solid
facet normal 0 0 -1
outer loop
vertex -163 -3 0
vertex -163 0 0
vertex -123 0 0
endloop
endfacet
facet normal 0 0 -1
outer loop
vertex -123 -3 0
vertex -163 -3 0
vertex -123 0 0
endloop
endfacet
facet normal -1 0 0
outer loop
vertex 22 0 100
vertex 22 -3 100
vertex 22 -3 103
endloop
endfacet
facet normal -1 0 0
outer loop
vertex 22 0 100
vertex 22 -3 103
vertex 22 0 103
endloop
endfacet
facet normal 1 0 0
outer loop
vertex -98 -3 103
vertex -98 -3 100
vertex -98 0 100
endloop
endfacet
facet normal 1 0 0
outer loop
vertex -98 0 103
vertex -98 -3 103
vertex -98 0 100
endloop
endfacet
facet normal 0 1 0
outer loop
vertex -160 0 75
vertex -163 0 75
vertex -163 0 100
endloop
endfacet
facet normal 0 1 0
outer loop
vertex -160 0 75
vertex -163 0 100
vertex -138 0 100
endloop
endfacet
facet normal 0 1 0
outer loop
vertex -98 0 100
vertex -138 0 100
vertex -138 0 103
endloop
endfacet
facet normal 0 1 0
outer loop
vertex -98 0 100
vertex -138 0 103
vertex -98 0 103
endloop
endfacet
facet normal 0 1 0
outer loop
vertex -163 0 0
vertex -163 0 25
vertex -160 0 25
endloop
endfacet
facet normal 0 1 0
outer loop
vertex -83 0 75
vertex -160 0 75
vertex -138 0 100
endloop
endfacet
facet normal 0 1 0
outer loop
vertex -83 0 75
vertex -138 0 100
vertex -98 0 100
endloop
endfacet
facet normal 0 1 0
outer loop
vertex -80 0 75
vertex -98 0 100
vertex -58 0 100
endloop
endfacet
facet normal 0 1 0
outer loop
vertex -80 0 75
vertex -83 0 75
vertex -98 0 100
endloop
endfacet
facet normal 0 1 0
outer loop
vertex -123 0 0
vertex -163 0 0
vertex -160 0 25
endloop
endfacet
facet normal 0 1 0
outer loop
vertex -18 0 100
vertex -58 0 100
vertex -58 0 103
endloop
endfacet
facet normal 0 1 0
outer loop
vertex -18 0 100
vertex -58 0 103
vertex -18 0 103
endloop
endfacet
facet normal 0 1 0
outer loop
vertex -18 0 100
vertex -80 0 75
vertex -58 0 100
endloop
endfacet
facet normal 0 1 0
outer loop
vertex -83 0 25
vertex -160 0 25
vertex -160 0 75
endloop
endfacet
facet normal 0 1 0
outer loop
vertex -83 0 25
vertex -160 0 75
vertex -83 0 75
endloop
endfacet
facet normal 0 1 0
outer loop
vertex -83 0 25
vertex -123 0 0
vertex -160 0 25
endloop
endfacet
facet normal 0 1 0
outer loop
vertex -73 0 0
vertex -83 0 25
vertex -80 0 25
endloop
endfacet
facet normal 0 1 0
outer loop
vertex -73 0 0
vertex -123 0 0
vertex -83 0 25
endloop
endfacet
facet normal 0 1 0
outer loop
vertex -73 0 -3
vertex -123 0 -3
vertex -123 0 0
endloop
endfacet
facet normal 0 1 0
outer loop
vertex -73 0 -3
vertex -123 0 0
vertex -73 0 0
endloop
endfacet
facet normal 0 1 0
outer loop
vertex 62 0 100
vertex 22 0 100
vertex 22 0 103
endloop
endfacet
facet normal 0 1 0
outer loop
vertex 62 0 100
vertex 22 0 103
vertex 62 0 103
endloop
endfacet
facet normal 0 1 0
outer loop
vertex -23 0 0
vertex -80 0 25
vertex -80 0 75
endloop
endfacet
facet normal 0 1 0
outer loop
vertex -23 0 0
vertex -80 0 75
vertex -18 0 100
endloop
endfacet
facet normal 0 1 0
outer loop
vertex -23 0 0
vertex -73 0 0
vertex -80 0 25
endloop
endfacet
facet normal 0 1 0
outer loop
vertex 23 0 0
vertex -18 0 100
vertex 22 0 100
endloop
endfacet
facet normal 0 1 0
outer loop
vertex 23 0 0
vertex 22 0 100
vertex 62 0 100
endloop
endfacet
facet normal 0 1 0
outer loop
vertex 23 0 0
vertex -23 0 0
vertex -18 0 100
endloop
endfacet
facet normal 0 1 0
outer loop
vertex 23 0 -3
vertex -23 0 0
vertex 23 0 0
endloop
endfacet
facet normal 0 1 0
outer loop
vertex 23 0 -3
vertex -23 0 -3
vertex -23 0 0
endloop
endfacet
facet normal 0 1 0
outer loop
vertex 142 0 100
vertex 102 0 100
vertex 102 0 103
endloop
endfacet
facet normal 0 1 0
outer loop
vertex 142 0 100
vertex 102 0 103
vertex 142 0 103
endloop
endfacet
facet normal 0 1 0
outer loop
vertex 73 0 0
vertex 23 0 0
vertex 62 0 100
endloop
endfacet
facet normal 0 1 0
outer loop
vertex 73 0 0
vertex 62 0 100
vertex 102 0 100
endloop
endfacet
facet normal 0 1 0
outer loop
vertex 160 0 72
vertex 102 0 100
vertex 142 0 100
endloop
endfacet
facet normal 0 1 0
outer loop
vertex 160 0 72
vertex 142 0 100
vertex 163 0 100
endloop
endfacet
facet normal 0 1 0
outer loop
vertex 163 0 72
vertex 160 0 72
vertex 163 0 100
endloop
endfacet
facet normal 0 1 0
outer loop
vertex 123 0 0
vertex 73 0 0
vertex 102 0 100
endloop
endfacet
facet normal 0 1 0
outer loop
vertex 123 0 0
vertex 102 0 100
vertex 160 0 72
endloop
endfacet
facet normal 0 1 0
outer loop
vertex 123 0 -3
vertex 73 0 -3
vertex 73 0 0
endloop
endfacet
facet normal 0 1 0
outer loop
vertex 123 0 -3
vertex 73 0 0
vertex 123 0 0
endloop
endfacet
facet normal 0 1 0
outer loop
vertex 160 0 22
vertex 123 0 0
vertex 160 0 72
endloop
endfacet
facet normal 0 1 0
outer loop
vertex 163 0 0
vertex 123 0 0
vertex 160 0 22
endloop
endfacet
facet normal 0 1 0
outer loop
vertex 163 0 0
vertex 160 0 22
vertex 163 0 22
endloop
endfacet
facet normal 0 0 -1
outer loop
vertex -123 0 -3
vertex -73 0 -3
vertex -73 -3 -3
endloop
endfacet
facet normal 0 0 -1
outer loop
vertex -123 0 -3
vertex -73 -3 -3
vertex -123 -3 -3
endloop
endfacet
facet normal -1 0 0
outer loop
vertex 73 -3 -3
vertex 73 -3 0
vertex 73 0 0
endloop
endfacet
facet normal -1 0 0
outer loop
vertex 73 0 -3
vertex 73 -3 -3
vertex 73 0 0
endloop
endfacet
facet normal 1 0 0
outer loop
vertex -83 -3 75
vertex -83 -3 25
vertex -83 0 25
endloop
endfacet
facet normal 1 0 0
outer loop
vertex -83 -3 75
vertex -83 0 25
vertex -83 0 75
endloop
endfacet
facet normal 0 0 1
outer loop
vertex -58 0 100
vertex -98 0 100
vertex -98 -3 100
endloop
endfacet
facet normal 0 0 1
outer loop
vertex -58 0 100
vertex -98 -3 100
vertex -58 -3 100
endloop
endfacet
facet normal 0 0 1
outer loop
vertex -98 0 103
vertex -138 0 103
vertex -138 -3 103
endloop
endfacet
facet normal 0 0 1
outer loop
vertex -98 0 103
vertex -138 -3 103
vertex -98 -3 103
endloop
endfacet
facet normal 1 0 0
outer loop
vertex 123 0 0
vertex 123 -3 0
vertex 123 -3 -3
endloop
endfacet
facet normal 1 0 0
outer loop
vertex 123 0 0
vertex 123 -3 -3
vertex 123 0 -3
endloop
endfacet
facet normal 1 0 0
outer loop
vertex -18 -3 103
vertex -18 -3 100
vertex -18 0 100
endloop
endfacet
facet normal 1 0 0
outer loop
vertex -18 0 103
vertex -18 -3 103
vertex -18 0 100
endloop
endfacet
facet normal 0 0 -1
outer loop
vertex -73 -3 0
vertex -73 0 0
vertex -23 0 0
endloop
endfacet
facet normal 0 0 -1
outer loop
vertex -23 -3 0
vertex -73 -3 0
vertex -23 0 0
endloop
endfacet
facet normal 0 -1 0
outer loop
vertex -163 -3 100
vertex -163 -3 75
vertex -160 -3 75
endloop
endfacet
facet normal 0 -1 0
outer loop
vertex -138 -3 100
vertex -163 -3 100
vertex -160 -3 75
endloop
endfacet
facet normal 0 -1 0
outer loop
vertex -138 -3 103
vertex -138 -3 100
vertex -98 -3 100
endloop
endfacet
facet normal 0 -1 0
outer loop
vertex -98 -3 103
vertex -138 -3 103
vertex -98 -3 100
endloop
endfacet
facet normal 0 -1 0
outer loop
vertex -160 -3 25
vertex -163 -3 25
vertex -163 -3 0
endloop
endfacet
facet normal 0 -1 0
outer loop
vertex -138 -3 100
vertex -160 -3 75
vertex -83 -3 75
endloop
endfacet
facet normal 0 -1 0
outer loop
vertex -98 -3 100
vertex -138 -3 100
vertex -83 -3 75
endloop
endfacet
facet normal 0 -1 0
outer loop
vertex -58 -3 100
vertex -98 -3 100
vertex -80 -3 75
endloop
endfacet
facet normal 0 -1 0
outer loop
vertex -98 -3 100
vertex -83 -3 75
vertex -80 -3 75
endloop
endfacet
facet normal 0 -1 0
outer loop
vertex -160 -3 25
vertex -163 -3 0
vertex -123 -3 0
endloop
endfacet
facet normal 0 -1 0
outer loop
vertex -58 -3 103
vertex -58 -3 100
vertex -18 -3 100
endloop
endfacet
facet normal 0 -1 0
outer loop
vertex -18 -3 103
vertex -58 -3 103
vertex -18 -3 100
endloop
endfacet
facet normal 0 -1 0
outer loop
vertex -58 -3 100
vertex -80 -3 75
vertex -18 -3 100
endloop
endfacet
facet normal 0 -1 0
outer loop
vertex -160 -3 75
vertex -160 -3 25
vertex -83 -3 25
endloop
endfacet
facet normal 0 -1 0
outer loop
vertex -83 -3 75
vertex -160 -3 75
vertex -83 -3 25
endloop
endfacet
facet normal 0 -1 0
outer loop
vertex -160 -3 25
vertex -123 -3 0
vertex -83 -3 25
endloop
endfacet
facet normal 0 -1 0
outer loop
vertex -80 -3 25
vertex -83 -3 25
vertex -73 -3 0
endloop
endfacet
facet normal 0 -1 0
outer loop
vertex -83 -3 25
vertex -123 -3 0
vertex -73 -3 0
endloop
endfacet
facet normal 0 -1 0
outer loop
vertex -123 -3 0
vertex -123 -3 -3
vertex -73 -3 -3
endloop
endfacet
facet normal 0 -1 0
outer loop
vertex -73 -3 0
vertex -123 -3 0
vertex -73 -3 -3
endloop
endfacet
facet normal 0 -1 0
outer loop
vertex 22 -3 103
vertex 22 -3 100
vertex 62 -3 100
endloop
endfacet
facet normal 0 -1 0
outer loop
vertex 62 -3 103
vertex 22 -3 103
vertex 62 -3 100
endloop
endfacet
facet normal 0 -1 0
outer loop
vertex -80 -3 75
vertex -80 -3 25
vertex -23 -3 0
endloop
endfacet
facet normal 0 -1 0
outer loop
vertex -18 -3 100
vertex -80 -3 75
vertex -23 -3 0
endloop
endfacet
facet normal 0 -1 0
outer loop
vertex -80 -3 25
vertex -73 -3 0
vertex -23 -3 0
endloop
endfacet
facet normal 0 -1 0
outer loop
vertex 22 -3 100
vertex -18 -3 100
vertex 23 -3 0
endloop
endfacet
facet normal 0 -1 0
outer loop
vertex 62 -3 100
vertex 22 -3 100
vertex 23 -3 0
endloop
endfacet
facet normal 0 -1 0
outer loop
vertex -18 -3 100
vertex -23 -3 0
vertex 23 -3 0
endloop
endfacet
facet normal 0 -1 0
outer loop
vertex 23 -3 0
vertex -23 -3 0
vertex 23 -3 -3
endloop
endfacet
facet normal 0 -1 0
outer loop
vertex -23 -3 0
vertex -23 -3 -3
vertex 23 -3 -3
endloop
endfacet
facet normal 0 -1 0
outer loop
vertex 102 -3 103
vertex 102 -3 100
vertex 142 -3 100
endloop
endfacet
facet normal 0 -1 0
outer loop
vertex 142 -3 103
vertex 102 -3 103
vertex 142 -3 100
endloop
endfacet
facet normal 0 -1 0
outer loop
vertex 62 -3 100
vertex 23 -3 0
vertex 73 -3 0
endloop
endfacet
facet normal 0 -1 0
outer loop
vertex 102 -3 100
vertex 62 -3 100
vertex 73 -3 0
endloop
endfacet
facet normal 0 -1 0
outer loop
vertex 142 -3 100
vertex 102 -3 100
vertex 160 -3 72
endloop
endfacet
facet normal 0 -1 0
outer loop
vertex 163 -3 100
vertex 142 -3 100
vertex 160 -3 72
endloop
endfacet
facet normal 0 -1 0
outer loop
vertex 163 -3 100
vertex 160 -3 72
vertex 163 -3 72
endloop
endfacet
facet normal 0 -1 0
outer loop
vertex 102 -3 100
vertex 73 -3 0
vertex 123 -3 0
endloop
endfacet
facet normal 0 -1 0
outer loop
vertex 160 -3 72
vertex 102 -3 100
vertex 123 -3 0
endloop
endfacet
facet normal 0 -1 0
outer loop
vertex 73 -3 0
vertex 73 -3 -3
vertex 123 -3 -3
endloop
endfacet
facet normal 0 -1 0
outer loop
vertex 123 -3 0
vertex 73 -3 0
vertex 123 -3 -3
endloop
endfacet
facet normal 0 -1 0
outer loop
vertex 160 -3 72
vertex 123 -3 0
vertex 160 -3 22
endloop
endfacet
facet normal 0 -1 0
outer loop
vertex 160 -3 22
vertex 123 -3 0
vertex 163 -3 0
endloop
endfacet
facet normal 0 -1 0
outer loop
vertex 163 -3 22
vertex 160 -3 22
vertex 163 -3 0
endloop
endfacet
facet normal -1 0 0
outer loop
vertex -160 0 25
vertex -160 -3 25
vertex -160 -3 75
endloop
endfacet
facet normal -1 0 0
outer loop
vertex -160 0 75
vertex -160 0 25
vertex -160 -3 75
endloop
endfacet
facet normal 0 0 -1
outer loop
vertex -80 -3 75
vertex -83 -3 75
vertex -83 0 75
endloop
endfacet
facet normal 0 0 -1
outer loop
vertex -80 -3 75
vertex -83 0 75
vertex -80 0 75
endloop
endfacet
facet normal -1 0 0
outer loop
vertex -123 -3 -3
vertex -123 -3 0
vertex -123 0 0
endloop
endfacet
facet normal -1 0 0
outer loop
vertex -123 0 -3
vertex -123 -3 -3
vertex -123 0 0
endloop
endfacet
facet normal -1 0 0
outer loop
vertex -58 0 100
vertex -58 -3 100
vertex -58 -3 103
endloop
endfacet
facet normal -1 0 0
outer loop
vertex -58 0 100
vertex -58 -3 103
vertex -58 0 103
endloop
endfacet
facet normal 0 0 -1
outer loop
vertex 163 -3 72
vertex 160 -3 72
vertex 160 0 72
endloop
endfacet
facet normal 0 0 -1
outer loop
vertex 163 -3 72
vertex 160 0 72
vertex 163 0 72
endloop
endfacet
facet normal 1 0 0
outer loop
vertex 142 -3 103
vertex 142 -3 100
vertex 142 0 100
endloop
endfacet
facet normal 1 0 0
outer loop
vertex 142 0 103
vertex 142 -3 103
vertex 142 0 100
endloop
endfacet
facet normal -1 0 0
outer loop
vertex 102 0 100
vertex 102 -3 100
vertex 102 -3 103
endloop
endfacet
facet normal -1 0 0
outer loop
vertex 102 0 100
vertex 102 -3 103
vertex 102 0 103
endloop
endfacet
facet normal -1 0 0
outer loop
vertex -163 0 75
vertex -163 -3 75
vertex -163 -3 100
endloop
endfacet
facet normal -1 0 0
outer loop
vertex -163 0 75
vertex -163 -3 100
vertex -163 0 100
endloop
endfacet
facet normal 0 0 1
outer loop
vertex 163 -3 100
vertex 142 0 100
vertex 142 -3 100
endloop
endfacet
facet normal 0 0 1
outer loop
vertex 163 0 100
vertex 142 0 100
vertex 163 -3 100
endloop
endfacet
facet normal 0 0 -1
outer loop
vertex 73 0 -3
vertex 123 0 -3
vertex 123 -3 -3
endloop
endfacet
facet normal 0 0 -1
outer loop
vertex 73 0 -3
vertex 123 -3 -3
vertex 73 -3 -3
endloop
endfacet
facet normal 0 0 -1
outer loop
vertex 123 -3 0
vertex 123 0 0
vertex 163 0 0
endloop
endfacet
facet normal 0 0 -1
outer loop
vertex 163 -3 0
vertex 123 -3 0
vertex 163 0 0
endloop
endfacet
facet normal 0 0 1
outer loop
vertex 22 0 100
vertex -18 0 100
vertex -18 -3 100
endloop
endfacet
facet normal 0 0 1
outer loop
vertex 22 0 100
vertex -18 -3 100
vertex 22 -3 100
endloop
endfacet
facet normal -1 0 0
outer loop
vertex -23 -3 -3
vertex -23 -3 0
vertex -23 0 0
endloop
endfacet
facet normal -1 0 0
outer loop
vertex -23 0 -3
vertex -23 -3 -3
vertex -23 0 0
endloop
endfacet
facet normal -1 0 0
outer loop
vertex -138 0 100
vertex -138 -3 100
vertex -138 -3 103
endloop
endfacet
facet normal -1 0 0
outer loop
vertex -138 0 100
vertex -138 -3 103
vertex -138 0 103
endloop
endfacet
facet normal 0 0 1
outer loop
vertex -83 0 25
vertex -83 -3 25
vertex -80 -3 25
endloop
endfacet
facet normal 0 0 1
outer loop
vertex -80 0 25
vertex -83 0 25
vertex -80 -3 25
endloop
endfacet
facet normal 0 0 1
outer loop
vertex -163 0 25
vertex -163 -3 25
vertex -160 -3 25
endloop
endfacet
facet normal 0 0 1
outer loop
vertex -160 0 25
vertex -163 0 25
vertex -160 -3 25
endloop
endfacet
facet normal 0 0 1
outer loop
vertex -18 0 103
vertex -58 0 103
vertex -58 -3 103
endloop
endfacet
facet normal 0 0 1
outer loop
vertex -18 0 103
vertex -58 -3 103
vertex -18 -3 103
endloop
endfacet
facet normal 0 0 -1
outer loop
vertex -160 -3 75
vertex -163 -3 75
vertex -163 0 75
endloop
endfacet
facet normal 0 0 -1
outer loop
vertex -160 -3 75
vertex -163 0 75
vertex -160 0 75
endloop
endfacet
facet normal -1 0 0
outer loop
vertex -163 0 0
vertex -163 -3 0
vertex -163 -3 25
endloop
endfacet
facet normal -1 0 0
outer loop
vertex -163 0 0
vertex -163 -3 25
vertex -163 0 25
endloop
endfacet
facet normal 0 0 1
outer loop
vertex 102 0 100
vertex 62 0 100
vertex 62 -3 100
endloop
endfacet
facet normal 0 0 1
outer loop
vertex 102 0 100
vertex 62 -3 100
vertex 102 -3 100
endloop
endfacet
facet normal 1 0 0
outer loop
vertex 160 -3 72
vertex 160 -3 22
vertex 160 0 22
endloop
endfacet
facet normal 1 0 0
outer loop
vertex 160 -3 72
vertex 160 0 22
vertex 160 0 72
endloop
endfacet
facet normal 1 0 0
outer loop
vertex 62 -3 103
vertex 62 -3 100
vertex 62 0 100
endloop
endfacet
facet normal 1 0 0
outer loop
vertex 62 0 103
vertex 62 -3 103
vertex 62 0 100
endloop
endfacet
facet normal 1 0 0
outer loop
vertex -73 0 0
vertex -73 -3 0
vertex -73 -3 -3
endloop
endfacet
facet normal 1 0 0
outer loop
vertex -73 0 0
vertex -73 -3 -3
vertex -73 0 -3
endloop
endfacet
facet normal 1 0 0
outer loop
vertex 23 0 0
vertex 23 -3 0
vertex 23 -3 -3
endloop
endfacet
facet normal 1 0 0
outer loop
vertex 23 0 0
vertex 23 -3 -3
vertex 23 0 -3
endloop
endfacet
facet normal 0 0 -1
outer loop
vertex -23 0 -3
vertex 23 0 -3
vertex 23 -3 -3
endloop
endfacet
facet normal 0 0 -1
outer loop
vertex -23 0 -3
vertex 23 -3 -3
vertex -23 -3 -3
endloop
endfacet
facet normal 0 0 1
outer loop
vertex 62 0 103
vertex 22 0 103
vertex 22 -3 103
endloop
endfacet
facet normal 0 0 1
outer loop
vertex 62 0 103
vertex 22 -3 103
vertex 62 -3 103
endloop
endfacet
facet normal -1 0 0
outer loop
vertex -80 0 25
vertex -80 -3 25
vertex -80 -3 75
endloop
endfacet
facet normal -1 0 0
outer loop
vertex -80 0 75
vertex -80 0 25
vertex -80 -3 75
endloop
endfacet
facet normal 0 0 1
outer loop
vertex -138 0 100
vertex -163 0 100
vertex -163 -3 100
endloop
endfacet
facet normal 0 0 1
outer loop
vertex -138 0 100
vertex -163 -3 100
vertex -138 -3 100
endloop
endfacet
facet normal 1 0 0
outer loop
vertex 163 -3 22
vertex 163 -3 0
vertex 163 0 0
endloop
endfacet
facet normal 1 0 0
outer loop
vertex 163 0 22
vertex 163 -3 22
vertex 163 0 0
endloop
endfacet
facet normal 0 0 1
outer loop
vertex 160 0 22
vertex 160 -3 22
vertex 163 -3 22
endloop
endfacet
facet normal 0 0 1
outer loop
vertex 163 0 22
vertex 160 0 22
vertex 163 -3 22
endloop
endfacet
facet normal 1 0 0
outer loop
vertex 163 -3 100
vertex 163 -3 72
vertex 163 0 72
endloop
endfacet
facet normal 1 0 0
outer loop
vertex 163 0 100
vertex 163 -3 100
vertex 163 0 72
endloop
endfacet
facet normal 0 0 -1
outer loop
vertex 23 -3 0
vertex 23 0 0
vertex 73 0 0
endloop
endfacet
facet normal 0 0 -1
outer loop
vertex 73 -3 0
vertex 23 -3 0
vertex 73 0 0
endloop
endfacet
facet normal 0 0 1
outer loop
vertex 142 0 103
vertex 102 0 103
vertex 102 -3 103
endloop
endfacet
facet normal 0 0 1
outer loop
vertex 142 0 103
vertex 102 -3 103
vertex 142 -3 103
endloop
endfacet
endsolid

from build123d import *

# Parameters (mm, degrees)
SKETCH1_W           = 326
SKETCH1_H           = 3
BOSS_EXTRUDE1_DEPTH = 100
SKETCH2_W           = 50
SKETCH2_H           = 3
SKETCH2_W_2         = 46
BOSS_EXTRUDE2_DEPTH = 3
SKETCH3_W           = 3
SKETCH3_H           = 50
CUT_EXTRUDE1_DEPTH  = 6
SKETCH4_W           = 3
SKETCH4_H           = 50
CUT_EXTRUDE2_DEPTH  = 6
SKETCH5_W           = 3
SKETCH5_H           = 50
CUT_EXTRUDE3_DEPTH  = 6
SKETCH6_W           = 40
SKETCH6_H           = 3
BOSS_EXTRUDE3_DEPTH = 3


with BuildPart() as part:
    # Sketch1 → Boss-Extrude1 (new body)
    with BuildSketch(Plane.XY):
        with Locations((0, -1.5)):
            Rectangle(SKETCH1_W, SKETCH1_H)
    extrude(amount=BOSS_EXTRUDE1_DEPTH)

    # Sketch2 → Boss-Extrude2 (add)
    with BuildSketch(Plane(origin=(0, 0, 0), x_dir=(-1, 0, 0), z_dir=(0, 0, -1))):
        with Locations((-98, -1.5)):
            Rectangle(SKETCH2_W, SKETCH2_H)
        with Locations((0, -1.5)):
            Rectangle(SKETCH2_W_2, SKETCH2_H)
        with Locations((98, -1.5)):
            Rectangle(SKETCH2_W, SKETCH2_H)
    extrude(amount=BOSS_EXTRUDE2_DEPTH)

    # Sketch3 → Cut-Extrude1 (cut)
    with BuildSketch(Plane.XZ.offset(3)):
        with Locations((-161.5, 50)):
            Rectangle(SKETCH3_W, SKETCH3_H)
    extrude(amount=-CUT_EXTRUDE1_DEPTH, mode=Mode.SUBTRACT)

    # Sketch4 → Cut-Extrude2 (cut)
    with BuildSketch(Plane.XZ.offset(3)):
        with Locations((-81.5, 50)):
            Rectangle(SKETCH4_W, SKETCH4_H)
    extrude(amount=-CUT_EXTRUDE2_DEPTH, mode=Mode.SUBTRACT)

    # Sketch5 → Cut-Extrude3 (cut)
    with BuildSketch(Plane.XZ.offset(3)):
        with Locations((161.5, 47)):
            Rectangle(SKETCH5_W, SKETCH5_H)
    extrude(amount=-CUT_EXTRUDE3_DEPTH, mode=Mode.SUBTRACT)

    # Sketch6 → Boss-Extrude3 (add)
    with BuildSketch(Plane.XY.offset(100)):
        with Locations((-118, -1.5)):
            Rectangle(SKETCH6_W, SKETCH6_H)
        with Locations((-38, -1.5)):
            Rectangle(SKETCH6_W, SKETCH6_H)
        with Locations((42, -1.5)):
            Rectangle(SKETCH6_W, SKETCH6_H)
        with Locations((122, -1.5)):
            Rectangle(SKETCH6_W, SKETCH6_H)
    extrude(amount=BOSS_EXTRUDE3_DEPTH)


solid = part.part
